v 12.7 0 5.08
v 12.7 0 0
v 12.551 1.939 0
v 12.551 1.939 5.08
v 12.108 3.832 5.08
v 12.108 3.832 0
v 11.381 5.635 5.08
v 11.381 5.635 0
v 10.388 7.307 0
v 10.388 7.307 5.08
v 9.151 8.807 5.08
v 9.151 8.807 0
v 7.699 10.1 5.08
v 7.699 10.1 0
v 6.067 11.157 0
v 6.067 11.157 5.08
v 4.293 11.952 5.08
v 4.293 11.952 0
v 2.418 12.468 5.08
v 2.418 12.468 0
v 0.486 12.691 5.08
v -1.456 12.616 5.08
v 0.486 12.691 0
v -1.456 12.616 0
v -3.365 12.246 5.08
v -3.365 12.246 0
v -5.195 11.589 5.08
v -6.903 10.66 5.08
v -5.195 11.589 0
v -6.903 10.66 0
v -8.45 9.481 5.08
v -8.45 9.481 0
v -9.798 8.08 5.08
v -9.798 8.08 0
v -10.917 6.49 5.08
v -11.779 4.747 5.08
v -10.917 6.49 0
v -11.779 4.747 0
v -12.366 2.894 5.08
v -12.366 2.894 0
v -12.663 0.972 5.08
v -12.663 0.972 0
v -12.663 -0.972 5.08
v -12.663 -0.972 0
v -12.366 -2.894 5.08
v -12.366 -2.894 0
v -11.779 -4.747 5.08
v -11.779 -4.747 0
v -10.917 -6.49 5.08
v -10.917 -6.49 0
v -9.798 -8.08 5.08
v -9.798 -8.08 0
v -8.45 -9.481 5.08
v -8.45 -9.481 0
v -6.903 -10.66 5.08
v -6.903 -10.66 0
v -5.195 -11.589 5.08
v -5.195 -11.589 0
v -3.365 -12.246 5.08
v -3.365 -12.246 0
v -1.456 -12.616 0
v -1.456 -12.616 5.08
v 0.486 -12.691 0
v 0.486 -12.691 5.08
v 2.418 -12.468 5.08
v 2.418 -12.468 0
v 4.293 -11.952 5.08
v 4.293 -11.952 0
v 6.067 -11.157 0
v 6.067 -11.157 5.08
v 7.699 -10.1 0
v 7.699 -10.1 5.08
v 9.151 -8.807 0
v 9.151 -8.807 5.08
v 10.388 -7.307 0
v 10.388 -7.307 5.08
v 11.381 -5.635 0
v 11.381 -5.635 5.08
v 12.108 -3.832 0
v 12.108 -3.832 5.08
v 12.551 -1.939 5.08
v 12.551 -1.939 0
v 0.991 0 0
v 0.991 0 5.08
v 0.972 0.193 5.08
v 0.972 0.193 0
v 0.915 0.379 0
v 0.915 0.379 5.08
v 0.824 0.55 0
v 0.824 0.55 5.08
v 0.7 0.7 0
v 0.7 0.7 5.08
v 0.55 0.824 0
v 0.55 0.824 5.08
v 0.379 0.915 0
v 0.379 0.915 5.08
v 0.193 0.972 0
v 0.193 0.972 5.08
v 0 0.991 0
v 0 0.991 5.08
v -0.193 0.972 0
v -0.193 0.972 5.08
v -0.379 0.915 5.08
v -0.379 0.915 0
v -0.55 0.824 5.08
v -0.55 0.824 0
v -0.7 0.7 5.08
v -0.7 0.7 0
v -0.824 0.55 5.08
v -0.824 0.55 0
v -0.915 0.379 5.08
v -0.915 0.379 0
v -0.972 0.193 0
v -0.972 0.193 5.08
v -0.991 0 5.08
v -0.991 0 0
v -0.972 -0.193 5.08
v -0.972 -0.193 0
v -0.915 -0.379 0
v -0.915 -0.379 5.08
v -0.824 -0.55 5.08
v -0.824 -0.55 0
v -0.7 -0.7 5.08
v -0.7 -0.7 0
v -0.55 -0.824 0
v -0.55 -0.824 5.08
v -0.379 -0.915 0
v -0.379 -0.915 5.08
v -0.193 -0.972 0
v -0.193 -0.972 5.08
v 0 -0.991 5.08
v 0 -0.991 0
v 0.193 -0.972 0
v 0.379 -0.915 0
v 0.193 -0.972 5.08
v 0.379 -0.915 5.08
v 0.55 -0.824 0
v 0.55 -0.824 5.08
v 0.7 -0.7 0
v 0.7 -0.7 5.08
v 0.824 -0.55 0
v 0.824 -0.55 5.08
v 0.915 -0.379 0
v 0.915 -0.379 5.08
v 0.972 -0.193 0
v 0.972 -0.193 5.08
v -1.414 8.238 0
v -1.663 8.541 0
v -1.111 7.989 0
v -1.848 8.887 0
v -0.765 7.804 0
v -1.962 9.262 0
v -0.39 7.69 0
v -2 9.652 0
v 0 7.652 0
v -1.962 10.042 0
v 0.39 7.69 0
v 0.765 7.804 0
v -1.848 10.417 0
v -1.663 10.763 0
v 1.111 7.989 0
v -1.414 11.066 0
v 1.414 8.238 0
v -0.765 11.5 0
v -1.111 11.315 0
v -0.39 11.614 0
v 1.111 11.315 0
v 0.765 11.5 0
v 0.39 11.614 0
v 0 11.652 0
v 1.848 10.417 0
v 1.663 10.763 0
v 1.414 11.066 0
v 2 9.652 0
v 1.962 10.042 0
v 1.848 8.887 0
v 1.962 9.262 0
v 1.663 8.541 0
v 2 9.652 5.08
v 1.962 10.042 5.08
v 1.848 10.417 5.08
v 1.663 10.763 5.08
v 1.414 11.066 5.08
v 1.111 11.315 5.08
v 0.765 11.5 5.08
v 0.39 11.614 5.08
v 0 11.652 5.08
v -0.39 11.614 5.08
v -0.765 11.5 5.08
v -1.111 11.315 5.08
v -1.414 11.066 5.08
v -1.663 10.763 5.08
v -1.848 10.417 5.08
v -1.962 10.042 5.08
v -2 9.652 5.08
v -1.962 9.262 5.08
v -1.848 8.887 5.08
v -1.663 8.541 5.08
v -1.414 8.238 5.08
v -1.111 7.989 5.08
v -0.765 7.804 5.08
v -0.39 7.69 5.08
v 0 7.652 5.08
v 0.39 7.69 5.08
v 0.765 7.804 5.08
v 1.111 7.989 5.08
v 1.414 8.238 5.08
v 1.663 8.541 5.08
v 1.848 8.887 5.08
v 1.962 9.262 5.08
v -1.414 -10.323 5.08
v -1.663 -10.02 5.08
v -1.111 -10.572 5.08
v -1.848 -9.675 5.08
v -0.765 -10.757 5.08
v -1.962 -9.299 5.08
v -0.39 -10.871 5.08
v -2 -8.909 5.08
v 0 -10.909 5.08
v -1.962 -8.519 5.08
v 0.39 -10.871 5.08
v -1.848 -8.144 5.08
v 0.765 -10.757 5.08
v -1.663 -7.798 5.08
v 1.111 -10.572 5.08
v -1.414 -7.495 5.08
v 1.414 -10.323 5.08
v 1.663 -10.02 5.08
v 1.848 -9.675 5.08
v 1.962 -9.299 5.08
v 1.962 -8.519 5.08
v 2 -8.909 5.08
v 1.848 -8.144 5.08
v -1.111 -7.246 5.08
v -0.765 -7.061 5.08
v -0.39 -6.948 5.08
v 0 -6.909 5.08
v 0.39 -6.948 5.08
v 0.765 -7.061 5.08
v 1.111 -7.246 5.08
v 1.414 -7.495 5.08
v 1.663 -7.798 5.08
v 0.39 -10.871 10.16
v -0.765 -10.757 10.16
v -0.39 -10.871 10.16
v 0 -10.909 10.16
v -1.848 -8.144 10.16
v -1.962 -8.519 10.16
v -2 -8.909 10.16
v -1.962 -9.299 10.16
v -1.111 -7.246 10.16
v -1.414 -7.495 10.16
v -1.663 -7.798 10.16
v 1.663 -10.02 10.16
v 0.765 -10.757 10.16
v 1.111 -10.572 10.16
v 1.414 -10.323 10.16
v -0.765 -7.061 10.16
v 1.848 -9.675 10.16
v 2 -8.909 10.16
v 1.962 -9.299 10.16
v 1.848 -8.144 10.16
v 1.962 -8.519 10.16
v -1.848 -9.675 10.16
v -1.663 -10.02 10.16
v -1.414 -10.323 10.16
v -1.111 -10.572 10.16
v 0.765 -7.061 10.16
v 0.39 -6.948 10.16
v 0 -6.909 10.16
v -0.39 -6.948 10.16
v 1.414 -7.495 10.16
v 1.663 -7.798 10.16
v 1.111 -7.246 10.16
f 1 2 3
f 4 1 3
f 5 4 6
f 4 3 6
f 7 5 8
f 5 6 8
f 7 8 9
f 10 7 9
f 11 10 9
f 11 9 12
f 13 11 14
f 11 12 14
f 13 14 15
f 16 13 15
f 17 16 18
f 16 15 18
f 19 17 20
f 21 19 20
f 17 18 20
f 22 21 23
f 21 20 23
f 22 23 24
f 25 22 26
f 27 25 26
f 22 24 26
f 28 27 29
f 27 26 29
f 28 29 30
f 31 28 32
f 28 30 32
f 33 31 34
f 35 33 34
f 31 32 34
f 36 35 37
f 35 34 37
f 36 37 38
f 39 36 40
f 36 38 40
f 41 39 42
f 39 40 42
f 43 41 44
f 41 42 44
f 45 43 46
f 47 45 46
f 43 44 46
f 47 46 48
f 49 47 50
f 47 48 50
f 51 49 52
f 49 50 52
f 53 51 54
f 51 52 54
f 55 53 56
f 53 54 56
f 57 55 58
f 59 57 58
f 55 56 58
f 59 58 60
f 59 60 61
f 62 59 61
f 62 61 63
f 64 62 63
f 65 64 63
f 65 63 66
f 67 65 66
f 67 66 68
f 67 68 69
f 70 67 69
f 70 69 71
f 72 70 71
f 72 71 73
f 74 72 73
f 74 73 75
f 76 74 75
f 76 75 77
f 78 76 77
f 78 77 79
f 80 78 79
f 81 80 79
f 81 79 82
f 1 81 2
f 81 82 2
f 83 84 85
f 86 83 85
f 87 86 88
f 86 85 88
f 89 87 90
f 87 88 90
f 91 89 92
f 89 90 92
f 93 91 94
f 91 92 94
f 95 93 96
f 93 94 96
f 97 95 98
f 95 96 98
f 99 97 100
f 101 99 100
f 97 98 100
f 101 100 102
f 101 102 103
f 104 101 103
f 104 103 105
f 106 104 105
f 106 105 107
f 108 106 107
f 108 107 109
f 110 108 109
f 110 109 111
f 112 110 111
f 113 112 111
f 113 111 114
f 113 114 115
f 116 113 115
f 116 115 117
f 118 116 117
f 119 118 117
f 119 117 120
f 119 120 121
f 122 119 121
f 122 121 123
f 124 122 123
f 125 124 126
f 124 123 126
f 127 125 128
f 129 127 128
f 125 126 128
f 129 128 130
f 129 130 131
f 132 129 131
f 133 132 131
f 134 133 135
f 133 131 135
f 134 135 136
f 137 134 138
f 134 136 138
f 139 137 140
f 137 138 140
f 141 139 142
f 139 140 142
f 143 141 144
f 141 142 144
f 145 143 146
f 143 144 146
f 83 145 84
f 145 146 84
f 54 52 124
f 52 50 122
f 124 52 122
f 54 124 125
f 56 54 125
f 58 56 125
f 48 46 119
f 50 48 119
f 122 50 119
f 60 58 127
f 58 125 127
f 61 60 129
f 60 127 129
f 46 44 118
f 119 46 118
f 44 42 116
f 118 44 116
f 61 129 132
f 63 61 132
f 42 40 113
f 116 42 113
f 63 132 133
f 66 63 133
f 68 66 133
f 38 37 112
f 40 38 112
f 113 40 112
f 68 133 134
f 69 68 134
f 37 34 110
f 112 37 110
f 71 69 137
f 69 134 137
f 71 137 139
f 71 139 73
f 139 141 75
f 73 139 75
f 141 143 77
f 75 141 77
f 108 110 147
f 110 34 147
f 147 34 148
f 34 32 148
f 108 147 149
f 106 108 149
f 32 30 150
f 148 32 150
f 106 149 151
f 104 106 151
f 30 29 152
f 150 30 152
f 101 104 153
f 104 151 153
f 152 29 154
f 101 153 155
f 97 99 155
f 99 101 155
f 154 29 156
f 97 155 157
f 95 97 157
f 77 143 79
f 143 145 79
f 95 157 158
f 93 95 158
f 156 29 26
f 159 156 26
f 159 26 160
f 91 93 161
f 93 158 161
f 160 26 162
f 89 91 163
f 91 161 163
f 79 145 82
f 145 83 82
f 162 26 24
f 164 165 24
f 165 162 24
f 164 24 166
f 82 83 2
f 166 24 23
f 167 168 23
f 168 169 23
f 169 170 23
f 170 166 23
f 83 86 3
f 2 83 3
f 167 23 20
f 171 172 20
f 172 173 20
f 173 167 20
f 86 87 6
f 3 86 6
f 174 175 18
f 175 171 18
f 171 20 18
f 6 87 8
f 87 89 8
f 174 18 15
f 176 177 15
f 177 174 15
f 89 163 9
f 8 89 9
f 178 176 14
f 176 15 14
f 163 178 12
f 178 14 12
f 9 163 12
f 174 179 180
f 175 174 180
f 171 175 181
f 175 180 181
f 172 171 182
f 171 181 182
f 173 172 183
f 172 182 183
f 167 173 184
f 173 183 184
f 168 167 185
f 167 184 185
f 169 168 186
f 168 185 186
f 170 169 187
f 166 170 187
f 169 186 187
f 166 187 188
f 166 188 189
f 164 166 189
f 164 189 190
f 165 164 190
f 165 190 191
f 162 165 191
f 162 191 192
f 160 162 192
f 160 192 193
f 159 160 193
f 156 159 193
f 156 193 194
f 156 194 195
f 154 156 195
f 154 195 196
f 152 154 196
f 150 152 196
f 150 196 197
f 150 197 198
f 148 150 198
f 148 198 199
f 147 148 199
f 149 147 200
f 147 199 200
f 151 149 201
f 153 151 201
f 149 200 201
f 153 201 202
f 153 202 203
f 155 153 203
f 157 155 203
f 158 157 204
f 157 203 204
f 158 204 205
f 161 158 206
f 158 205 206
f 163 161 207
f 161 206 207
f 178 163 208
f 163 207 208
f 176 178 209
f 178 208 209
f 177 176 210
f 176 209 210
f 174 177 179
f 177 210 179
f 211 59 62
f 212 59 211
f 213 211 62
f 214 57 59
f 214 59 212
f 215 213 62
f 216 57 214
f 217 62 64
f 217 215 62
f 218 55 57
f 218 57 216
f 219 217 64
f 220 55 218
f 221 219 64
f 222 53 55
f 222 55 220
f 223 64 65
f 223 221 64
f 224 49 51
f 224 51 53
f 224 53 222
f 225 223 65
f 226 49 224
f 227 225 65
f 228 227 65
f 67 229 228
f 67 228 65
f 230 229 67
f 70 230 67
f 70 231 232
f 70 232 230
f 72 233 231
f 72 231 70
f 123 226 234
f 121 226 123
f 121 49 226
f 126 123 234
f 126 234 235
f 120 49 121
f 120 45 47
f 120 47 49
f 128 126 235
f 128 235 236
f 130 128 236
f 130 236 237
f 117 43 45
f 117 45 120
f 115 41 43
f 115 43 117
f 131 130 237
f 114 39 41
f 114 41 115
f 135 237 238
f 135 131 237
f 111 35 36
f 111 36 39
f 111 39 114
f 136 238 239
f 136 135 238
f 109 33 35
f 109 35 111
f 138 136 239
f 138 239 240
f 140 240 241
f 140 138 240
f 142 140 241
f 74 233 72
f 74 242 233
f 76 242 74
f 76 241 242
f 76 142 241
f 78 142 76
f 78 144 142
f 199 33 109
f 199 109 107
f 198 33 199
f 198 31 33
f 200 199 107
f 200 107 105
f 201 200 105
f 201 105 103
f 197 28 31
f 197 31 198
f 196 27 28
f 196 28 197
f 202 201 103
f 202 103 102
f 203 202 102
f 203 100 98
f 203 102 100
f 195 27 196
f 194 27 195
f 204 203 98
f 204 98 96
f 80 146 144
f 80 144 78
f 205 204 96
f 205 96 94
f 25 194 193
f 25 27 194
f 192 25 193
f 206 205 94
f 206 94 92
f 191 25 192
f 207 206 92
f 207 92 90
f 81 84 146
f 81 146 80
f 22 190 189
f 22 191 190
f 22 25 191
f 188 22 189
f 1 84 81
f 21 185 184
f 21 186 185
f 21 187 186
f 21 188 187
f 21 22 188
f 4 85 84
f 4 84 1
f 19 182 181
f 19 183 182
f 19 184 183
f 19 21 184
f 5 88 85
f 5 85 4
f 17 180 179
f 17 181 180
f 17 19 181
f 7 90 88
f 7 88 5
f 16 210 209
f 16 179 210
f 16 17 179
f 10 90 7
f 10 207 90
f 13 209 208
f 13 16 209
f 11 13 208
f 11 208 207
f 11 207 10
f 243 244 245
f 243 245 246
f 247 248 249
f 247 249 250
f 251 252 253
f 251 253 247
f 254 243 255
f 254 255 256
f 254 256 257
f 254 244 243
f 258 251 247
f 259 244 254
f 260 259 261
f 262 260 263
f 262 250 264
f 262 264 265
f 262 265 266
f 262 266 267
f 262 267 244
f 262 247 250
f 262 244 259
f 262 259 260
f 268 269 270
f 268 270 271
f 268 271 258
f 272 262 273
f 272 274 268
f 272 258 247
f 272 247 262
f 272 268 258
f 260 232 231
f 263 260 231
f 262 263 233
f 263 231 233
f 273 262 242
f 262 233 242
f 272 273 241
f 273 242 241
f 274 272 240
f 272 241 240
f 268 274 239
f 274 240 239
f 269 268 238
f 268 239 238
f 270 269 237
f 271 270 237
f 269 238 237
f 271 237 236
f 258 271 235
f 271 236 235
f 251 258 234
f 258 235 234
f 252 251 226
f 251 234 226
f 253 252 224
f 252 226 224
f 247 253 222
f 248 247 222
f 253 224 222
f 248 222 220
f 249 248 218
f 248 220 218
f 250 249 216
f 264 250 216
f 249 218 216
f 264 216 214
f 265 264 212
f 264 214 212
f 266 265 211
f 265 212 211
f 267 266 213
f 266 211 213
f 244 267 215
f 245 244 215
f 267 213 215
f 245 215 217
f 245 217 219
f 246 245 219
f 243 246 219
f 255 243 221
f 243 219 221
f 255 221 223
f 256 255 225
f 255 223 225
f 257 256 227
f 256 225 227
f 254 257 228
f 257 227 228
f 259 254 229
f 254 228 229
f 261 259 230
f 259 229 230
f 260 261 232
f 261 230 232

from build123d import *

# Parameters (mm, degrees)
SKETCH1_R           = 12.7
BOSS_EXTRUDE1_DEPTH = 5.08
SKETCH2_R           = 0.9906
CUT_EXTRUDE1_DEPTH  = 19.66511184
SKETCH3_R           = 2
CUT_EXTRUDE2_DEPTH  = 19.66511184
SKETCH4_R           = 2
BOSS_EXTRUDE2_DEPTH = 5.08


with BuildPart() as part:
    # Sketch1 → Boss-Extrude1 (new body)
    with BuildSketch(Plane.XY):
        Circle(SKETCH1_R)
    extrude(amount=BOSS_EXTRUDE1_DEPTH)

    # Sketch2 → Cut-Extrude1 (cut, through all)
    with BuildSketch(Plane.XY.offset(5.08)):
        Circle(SKETCH2_R)
    extrude(amount=-CUT_EXTRUDE1_DEPTH, mode=Mode.SUBTRACT)

    # Sketch3 → Cut-Extrude2 (cut, through all)
    with BuildSketch(Plane.XY.offset(5.08)):
        with Locations((0, 9.652)):
            Circle(SKETCH3_R)
    extrude(amount=-CUT_EXTRUDE2_DEPTH, mode=Mode.SUBTRACT)

    # Sketch4 → Boss-Extrude2 (add)
    with BuildSketch(Plane.XY.offset(5.08)):
        with Locations((0, -8.909221011)):
            Circle(SKETCH4_R)
    extrude(amount=BOSS_EXTRUDE2_DEPTH)


solid = part.part
